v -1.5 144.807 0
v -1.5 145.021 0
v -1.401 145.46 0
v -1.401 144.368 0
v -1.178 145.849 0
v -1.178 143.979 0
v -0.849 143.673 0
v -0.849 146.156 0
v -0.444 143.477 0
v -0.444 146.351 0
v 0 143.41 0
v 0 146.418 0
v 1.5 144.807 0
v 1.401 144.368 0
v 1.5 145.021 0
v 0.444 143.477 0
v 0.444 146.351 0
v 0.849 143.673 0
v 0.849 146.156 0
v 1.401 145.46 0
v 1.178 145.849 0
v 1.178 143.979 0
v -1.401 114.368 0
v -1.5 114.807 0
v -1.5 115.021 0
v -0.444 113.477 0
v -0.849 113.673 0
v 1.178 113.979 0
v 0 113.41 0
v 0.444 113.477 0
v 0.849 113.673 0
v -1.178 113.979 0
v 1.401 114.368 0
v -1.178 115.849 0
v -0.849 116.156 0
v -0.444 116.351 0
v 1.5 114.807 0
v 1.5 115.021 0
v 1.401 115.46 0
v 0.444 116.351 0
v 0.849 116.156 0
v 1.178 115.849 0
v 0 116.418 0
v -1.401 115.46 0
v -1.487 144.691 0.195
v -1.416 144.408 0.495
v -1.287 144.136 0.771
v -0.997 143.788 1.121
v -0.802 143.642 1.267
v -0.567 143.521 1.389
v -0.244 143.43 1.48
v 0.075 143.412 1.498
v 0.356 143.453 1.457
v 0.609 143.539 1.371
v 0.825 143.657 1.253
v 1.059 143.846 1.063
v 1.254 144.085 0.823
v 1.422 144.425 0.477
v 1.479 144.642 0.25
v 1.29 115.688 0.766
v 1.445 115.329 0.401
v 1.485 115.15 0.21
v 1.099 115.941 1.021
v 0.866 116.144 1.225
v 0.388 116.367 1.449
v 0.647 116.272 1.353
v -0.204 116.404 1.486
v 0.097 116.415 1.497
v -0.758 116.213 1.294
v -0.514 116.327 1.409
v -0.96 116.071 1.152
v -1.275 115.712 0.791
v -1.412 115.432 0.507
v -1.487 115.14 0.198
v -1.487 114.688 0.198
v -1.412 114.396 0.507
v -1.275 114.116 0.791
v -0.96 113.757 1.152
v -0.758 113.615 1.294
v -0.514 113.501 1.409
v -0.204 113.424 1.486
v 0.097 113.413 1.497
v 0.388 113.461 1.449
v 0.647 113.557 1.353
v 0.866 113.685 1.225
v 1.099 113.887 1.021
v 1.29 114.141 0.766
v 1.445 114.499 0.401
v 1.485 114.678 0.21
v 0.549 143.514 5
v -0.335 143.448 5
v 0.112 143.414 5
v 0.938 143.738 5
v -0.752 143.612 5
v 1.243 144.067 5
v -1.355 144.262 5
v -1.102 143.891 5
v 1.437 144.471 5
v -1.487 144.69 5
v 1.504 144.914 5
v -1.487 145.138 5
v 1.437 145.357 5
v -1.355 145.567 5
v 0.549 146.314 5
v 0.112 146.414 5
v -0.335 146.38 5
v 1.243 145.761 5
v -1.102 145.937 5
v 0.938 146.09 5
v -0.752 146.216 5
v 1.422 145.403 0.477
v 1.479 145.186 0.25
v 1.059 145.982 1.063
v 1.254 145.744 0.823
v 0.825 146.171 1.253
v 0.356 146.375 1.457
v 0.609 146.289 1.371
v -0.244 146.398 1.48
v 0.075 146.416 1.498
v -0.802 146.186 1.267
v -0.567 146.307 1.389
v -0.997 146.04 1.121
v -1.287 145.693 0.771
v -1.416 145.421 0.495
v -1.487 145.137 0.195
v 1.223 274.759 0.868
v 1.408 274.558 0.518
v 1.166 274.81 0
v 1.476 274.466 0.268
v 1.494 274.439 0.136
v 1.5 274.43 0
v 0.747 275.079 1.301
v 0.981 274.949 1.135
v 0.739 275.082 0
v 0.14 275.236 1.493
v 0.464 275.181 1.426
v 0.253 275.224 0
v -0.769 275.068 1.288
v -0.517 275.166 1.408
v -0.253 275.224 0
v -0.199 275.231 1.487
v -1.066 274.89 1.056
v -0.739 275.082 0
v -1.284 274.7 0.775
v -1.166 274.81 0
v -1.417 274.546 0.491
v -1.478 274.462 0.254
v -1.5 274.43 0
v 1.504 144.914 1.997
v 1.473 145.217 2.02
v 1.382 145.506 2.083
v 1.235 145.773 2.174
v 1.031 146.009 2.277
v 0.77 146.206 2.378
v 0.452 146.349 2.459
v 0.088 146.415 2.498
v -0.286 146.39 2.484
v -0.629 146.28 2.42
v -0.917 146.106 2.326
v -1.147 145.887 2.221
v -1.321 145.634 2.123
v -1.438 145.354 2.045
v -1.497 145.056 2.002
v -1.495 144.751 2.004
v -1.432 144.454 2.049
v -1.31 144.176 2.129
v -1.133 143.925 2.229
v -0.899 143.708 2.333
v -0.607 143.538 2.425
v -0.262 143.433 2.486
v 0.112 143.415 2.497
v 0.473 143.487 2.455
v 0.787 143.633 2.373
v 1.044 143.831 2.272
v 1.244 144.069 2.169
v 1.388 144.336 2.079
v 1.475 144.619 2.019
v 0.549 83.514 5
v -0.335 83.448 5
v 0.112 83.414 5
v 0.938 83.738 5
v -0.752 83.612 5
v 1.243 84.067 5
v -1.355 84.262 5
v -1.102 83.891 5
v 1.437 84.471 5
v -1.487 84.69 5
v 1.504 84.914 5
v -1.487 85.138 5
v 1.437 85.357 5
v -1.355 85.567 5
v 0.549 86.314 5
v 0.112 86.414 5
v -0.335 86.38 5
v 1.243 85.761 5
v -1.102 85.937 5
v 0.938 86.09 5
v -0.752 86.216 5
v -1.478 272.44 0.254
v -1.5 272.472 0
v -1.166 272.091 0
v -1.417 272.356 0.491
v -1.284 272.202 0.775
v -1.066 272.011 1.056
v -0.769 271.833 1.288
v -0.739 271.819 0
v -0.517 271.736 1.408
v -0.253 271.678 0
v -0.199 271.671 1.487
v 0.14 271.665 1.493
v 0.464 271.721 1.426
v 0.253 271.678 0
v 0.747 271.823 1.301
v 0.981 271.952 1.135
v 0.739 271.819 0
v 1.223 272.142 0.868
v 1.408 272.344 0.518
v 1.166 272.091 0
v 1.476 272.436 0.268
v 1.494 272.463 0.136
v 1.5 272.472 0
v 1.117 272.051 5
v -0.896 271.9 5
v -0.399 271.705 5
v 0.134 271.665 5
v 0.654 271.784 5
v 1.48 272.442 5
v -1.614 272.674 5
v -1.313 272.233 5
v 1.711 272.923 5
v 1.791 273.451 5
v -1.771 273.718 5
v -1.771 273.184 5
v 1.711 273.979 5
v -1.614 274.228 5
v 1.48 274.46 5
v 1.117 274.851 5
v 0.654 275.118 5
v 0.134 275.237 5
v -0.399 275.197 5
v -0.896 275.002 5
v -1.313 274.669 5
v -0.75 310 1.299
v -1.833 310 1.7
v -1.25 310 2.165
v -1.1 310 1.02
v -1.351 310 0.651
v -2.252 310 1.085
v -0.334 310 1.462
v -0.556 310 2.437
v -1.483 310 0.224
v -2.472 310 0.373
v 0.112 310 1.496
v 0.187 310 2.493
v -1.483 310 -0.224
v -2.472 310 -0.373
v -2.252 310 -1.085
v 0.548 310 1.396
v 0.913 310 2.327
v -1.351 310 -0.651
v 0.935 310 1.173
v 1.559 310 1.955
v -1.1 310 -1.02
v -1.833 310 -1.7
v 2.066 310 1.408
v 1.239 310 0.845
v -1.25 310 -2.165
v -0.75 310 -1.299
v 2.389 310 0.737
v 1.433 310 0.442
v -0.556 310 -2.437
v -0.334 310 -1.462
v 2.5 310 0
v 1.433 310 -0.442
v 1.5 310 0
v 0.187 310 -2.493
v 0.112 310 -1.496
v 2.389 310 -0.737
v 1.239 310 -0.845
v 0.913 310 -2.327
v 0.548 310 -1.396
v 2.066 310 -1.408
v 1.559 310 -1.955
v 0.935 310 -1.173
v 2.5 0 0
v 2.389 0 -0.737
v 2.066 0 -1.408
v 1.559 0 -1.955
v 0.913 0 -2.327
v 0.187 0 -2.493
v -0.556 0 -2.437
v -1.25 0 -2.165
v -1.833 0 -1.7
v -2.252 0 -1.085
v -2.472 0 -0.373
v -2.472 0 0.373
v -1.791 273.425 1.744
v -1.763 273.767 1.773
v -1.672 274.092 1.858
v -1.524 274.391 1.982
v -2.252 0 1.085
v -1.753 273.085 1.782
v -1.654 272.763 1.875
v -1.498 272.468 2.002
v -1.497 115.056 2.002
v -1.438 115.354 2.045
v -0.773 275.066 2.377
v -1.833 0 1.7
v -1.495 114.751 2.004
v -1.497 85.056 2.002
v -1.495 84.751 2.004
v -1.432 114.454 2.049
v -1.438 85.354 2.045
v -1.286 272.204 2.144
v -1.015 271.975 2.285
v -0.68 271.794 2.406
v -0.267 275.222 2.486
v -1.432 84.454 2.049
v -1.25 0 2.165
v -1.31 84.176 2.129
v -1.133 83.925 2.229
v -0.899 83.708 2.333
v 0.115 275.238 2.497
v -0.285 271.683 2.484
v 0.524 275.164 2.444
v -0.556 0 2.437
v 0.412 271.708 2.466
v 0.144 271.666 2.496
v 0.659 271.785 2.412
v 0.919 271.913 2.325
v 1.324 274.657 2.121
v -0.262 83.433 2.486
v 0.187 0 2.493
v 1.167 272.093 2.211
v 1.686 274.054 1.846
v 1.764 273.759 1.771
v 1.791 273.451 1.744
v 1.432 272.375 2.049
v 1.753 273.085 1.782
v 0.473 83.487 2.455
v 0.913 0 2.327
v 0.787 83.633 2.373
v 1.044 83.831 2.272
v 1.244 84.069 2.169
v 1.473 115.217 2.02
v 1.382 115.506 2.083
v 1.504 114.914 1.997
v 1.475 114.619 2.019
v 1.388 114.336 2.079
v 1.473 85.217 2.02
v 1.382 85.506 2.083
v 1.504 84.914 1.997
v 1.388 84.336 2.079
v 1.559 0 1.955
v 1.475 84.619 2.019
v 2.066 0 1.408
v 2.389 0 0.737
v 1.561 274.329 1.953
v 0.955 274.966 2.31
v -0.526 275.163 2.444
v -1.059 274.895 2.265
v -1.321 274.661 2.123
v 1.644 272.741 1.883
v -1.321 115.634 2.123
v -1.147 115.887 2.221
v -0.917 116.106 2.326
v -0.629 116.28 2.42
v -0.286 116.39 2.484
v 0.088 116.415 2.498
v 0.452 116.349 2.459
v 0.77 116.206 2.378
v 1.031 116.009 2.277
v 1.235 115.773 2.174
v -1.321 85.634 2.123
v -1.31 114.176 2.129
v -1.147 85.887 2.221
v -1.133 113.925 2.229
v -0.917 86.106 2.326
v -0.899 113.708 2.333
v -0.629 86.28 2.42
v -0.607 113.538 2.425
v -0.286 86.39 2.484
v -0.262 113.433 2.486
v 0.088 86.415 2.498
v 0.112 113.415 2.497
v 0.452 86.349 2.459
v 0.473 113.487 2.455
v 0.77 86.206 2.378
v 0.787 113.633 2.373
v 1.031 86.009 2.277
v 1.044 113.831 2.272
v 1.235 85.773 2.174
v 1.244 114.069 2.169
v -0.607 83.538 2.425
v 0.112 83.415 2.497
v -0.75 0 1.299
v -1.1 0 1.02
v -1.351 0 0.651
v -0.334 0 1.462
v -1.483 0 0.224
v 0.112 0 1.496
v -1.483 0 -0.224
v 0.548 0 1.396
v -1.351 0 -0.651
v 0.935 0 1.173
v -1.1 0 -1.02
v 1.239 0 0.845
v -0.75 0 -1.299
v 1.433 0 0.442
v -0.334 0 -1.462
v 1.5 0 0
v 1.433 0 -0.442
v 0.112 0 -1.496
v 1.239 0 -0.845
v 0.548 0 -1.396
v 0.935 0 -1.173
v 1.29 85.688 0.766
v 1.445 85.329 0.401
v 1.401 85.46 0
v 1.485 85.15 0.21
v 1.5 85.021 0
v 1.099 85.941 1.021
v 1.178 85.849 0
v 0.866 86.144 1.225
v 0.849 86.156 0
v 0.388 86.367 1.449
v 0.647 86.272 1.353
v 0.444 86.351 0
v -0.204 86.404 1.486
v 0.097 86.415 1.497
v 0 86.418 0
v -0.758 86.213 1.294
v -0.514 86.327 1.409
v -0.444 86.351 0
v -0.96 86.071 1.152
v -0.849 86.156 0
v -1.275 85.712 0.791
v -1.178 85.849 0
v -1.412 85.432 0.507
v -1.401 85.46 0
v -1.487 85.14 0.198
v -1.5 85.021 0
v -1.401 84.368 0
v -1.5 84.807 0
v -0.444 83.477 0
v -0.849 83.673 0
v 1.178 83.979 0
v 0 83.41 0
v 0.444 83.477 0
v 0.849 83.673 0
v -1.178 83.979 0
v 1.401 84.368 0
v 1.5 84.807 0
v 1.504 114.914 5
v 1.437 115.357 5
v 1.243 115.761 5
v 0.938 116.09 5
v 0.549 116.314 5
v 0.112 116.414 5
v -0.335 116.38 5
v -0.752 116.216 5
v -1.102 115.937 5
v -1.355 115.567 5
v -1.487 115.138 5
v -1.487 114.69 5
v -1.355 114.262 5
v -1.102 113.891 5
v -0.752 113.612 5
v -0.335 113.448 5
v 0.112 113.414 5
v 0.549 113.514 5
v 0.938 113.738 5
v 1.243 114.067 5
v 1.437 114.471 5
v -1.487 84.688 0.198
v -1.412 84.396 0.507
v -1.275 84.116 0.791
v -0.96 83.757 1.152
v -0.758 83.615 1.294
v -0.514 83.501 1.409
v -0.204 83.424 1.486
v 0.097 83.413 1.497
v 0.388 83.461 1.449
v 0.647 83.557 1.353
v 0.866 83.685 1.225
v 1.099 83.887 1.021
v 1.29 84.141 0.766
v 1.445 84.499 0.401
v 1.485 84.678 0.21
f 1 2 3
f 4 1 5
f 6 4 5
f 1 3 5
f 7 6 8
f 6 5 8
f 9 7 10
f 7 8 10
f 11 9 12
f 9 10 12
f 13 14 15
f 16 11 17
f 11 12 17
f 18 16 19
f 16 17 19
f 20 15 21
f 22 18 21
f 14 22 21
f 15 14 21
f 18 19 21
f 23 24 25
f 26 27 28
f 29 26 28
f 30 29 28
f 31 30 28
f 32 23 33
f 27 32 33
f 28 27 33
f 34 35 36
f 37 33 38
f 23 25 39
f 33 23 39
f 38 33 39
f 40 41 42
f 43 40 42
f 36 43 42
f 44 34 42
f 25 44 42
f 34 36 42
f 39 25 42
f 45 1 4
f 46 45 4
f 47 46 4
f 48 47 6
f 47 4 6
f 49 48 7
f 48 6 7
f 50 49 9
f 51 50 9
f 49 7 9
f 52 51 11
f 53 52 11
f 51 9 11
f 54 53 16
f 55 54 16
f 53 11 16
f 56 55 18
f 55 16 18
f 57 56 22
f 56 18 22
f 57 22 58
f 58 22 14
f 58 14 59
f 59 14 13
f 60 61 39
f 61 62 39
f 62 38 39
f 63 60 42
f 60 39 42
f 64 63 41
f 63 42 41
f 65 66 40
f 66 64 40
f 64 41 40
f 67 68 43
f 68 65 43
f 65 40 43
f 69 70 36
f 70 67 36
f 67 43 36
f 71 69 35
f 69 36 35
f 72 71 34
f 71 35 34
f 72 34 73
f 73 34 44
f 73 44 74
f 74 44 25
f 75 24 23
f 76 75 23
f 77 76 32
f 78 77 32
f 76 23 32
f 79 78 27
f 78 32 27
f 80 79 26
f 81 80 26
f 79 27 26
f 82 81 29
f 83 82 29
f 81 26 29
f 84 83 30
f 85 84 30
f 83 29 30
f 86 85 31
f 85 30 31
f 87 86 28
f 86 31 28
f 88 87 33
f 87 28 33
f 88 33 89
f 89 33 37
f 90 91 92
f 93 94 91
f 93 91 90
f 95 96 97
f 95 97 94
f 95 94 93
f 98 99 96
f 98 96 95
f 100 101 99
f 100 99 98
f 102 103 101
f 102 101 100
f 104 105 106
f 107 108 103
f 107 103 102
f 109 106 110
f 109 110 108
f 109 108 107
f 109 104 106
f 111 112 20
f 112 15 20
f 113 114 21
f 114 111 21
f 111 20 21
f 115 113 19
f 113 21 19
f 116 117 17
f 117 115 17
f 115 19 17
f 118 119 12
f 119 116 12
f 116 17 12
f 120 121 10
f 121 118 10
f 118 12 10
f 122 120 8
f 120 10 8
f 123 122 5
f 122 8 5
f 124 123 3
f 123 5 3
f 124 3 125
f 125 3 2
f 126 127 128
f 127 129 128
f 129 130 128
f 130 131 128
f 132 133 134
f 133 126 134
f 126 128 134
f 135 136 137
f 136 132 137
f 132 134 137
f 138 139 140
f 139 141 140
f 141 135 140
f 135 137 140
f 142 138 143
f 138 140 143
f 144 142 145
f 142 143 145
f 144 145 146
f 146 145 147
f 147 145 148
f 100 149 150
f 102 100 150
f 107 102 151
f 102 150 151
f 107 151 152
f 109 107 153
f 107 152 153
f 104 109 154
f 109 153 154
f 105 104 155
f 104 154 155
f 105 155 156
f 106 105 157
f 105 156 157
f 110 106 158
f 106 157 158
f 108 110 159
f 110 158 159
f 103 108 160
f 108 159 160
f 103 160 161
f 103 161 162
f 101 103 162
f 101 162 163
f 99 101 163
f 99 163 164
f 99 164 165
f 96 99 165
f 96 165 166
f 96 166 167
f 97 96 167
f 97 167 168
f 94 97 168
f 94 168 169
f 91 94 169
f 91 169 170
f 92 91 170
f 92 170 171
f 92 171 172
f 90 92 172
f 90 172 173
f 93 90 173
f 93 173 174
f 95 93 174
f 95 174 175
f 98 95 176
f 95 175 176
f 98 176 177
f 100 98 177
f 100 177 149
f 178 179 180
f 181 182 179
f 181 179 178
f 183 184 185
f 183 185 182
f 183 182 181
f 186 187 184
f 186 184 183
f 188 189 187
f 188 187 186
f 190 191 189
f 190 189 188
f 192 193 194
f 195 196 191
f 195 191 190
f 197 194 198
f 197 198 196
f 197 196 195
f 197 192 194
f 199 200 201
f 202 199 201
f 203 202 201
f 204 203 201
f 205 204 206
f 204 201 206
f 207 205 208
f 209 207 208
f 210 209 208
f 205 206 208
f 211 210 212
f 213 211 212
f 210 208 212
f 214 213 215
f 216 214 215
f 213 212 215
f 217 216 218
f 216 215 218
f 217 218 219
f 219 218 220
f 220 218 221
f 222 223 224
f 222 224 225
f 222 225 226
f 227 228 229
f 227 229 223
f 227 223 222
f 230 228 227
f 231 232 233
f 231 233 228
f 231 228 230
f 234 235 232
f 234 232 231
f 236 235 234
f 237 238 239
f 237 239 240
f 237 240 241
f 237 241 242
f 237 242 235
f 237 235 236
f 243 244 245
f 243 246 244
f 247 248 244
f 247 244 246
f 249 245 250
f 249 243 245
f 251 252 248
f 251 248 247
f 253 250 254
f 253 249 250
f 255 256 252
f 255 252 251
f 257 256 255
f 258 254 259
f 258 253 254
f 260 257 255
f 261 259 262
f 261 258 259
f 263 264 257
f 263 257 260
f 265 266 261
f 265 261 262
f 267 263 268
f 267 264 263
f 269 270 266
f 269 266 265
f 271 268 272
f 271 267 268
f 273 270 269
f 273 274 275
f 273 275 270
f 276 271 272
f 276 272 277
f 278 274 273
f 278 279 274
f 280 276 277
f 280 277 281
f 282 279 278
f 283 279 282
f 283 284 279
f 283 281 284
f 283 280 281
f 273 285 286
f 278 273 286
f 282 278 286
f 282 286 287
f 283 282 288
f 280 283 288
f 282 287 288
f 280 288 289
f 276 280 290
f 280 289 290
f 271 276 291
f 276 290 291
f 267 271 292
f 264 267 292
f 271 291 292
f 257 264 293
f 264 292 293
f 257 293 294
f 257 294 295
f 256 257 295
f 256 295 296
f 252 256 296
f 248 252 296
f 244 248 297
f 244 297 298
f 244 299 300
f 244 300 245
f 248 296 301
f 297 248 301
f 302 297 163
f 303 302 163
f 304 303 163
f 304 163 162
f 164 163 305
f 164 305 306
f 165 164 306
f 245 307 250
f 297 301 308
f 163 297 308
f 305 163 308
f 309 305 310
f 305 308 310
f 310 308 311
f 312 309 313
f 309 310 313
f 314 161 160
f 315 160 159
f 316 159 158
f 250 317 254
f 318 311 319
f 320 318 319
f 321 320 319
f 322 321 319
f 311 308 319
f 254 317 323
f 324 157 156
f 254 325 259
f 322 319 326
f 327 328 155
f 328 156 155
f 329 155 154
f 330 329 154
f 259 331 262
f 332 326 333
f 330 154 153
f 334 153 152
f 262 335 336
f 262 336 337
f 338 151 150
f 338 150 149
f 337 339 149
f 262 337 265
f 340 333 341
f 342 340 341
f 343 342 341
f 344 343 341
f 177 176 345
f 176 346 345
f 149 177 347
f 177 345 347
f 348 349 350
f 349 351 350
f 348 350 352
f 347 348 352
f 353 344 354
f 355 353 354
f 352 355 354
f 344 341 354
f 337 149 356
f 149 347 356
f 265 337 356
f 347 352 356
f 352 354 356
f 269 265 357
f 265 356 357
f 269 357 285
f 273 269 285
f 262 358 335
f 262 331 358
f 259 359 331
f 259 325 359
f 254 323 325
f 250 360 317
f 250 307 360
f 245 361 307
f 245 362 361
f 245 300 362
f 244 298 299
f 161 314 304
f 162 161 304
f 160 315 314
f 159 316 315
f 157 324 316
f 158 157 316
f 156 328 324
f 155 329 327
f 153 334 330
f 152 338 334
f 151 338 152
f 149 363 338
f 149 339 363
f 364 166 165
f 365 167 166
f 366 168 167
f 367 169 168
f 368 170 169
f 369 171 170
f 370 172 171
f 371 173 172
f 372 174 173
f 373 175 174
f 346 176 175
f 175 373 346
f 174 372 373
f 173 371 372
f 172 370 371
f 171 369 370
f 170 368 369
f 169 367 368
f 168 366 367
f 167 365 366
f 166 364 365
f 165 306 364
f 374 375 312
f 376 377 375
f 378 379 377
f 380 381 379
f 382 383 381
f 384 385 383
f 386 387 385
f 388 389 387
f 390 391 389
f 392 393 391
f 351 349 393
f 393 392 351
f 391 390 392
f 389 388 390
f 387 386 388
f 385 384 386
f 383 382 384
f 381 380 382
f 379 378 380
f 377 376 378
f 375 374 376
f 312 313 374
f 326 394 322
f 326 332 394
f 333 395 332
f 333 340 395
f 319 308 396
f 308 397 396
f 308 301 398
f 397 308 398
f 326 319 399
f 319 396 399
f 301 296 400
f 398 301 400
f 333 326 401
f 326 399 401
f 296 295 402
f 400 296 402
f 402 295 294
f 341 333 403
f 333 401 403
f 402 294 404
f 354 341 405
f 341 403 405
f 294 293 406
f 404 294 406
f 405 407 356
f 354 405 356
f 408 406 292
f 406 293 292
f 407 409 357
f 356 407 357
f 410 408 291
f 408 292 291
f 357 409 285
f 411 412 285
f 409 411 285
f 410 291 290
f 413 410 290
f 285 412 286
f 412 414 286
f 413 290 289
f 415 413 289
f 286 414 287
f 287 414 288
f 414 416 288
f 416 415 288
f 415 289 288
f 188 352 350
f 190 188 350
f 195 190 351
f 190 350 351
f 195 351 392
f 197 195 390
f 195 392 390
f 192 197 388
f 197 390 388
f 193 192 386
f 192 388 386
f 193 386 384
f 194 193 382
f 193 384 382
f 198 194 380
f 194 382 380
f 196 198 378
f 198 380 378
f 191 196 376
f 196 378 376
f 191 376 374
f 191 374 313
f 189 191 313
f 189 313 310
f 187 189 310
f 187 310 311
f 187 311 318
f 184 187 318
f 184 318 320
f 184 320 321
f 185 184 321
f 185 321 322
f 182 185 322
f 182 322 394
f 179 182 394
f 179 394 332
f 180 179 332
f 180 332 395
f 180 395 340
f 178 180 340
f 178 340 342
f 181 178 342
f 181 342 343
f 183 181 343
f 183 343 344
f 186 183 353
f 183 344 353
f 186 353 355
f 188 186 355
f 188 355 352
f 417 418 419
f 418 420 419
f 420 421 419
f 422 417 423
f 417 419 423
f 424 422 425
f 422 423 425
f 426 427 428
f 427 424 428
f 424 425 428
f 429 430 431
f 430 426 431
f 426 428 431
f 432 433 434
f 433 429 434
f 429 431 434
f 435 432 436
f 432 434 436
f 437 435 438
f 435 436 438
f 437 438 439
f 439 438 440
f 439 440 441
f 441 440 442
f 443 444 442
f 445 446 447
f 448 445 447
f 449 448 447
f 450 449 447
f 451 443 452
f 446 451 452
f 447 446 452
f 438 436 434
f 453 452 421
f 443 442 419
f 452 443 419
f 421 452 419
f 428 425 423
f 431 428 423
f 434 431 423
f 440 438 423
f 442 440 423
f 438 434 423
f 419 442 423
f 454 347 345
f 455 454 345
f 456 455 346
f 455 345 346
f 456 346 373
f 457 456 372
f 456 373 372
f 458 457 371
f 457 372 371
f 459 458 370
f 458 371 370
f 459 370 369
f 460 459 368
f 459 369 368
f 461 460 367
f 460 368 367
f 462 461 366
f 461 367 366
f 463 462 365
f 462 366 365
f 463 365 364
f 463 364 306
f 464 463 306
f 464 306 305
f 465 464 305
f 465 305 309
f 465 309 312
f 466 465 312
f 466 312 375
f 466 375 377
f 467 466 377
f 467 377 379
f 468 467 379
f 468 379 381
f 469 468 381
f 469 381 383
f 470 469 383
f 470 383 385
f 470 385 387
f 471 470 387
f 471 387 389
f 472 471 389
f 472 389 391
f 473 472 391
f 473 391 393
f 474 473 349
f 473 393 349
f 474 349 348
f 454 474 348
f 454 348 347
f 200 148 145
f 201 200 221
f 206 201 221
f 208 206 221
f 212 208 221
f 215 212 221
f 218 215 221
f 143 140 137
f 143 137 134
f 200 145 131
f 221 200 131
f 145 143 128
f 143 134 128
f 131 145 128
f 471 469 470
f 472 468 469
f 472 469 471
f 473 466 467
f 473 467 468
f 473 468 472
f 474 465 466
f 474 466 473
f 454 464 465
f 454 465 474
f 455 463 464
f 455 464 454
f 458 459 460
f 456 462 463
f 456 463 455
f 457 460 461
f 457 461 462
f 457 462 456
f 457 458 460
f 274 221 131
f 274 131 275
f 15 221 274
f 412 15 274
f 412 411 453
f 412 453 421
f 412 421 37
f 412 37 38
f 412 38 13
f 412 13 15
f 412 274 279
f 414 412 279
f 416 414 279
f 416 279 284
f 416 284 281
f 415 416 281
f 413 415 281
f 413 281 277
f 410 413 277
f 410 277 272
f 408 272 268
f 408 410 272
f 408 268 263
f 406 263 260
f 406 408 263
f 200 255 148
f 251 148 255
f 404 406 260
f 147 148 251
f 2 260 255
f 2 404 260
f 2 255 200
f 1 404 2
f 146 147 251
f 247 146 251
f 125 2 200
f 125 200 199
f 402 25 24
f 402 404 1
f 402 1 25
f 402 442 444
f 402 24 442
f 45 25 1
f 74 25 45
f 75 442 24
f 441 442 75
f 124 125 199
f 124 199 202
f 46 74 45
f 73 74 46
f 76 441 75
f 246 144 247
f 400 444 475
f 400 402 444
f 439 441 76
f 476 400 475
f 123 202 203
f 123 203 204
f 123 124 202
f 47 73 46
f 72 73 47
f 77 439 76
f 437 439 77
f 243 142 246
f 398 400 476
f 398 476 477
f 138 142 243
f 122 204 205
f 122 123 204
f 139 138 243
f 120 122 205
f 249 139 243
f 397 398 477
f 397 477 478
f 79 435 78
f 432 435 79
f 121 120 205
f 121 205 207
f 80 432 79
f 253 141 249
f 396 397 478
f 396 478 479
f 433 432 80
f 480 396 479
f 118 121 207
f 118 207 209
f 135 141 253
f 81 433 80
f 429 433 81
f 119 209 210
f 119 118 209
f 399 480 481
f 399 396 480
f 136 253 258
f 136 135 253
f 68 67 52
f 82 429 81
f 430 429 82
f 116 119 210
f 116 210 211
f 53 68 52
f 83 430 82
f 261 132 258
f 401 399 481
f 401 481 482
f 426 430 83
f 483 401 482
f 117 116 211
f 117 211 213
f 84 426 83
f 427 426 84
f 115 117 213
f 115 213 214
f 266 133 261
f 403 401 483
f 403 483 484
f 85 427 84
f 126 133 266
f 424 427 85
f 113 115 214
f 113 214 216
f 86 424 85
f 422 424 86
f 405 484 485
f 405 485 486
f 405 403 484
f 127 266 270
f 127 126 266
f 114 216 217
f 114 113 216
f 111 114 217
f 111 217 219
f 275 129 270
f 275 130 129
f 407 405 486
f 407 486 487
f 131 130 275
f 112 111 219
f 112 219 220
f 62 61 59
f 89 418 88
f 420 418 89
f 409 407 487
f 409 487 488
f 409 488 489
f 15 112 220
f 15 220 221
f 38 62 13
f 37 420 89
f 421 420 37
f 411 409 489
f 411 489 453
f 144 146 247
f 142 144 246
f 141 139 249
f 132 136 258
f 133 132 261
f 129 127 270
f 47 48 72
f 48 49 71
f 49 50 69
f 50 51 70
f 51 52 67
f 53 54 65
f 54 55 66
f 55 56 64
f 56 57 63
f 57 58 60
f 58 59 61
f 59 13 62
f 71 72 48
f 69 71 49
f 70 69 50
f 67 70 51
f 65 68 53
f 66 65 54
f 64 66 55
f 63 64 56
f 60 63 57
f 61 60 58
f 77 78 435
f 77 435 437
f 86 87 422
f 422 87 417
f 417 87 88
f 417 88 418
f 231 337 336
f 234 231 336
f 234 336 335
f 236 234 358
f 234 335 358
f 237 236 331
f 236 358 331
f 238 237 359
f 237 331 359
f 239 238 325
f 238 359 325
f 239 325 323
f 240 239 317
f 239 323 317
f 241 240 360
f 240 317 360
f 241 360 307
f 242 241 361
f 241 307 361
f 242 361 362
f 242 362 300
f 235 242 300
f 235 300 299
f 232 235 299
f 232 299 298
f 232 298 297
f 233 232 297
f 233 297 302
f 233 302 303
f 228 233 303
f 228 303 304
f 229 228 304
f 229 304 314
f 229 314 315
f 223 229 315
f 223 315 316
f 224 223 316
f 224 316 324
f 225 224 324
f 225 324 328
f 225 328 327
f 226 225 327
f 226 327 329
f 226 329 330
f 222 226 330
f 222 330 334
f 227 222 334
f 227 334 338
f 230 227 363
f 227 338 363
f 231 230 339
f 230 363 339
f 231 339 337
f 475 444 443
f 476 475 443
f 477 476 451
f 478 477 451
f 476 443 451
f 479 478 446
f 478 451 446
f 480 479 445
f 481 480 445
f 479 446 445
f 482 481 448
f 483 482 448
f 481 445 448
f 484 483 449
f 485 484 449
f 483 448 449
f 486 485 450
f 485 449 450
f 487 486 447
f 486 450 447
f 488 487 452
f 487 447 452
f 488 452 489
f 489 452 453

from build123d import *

# Parameters (mm, degrees)
SKETCH1_R           = 2.5
SKETCH1_R_2         = 1.5
BOSS_EXTRUDE1_DEPTH = 310
SKETCH2_R           = 1.503835311
BOSS_EXTRUDE2_DEPTH = 5
LPATTERN1_COUNT     = 3
LPATTERN1_PITCH     = 30
SKETCH3_R           = 1.791065429
BOSS_EXTRUDE3_DEPTH = 5


with BuildPart() as part:
    # Sketch1 → Boss-Extrude1 (new body)
    with BuildSketch(Plane(origin=(0, 0, 0), x_dir=(1, 0, 0), z_dir=(0, 1, 0))):
        Circle(SKETCH1_R)
        Circle(SKETCH1_R_2, mode=Mode.SUBTRACT)
    extrude(amount=BOSS_EXTRUDE1_DEPTH)

    # Sketch2 → Boss-Extrude2 (add)
    with BuildSketch(Plane.XY):
        with Locations((0, 84.914129816)):
            Circle(SKETCH2_R)
    boss_extrude2 = extrude(amount=BOSS_EXTRUDE2_DEPTH)

    # LPattern1: Boss-Extrude2 ×3
    with Locations(*[(0, i * LPATTERN1_PITCH, 0) for i in range(1, LPATTERN1_COUNT)]):
        add(boss_extrude2)

    # Sketch3 → Boss-Extrude3 (add)
    with BuildSketch(Plane.XY):
        with Locations((0, 273.450822339)):
            Circle(SKETCH3_R)
    extrude(amount=BOSS_EXTRUDE3_DEPTH)


solid = part.part
